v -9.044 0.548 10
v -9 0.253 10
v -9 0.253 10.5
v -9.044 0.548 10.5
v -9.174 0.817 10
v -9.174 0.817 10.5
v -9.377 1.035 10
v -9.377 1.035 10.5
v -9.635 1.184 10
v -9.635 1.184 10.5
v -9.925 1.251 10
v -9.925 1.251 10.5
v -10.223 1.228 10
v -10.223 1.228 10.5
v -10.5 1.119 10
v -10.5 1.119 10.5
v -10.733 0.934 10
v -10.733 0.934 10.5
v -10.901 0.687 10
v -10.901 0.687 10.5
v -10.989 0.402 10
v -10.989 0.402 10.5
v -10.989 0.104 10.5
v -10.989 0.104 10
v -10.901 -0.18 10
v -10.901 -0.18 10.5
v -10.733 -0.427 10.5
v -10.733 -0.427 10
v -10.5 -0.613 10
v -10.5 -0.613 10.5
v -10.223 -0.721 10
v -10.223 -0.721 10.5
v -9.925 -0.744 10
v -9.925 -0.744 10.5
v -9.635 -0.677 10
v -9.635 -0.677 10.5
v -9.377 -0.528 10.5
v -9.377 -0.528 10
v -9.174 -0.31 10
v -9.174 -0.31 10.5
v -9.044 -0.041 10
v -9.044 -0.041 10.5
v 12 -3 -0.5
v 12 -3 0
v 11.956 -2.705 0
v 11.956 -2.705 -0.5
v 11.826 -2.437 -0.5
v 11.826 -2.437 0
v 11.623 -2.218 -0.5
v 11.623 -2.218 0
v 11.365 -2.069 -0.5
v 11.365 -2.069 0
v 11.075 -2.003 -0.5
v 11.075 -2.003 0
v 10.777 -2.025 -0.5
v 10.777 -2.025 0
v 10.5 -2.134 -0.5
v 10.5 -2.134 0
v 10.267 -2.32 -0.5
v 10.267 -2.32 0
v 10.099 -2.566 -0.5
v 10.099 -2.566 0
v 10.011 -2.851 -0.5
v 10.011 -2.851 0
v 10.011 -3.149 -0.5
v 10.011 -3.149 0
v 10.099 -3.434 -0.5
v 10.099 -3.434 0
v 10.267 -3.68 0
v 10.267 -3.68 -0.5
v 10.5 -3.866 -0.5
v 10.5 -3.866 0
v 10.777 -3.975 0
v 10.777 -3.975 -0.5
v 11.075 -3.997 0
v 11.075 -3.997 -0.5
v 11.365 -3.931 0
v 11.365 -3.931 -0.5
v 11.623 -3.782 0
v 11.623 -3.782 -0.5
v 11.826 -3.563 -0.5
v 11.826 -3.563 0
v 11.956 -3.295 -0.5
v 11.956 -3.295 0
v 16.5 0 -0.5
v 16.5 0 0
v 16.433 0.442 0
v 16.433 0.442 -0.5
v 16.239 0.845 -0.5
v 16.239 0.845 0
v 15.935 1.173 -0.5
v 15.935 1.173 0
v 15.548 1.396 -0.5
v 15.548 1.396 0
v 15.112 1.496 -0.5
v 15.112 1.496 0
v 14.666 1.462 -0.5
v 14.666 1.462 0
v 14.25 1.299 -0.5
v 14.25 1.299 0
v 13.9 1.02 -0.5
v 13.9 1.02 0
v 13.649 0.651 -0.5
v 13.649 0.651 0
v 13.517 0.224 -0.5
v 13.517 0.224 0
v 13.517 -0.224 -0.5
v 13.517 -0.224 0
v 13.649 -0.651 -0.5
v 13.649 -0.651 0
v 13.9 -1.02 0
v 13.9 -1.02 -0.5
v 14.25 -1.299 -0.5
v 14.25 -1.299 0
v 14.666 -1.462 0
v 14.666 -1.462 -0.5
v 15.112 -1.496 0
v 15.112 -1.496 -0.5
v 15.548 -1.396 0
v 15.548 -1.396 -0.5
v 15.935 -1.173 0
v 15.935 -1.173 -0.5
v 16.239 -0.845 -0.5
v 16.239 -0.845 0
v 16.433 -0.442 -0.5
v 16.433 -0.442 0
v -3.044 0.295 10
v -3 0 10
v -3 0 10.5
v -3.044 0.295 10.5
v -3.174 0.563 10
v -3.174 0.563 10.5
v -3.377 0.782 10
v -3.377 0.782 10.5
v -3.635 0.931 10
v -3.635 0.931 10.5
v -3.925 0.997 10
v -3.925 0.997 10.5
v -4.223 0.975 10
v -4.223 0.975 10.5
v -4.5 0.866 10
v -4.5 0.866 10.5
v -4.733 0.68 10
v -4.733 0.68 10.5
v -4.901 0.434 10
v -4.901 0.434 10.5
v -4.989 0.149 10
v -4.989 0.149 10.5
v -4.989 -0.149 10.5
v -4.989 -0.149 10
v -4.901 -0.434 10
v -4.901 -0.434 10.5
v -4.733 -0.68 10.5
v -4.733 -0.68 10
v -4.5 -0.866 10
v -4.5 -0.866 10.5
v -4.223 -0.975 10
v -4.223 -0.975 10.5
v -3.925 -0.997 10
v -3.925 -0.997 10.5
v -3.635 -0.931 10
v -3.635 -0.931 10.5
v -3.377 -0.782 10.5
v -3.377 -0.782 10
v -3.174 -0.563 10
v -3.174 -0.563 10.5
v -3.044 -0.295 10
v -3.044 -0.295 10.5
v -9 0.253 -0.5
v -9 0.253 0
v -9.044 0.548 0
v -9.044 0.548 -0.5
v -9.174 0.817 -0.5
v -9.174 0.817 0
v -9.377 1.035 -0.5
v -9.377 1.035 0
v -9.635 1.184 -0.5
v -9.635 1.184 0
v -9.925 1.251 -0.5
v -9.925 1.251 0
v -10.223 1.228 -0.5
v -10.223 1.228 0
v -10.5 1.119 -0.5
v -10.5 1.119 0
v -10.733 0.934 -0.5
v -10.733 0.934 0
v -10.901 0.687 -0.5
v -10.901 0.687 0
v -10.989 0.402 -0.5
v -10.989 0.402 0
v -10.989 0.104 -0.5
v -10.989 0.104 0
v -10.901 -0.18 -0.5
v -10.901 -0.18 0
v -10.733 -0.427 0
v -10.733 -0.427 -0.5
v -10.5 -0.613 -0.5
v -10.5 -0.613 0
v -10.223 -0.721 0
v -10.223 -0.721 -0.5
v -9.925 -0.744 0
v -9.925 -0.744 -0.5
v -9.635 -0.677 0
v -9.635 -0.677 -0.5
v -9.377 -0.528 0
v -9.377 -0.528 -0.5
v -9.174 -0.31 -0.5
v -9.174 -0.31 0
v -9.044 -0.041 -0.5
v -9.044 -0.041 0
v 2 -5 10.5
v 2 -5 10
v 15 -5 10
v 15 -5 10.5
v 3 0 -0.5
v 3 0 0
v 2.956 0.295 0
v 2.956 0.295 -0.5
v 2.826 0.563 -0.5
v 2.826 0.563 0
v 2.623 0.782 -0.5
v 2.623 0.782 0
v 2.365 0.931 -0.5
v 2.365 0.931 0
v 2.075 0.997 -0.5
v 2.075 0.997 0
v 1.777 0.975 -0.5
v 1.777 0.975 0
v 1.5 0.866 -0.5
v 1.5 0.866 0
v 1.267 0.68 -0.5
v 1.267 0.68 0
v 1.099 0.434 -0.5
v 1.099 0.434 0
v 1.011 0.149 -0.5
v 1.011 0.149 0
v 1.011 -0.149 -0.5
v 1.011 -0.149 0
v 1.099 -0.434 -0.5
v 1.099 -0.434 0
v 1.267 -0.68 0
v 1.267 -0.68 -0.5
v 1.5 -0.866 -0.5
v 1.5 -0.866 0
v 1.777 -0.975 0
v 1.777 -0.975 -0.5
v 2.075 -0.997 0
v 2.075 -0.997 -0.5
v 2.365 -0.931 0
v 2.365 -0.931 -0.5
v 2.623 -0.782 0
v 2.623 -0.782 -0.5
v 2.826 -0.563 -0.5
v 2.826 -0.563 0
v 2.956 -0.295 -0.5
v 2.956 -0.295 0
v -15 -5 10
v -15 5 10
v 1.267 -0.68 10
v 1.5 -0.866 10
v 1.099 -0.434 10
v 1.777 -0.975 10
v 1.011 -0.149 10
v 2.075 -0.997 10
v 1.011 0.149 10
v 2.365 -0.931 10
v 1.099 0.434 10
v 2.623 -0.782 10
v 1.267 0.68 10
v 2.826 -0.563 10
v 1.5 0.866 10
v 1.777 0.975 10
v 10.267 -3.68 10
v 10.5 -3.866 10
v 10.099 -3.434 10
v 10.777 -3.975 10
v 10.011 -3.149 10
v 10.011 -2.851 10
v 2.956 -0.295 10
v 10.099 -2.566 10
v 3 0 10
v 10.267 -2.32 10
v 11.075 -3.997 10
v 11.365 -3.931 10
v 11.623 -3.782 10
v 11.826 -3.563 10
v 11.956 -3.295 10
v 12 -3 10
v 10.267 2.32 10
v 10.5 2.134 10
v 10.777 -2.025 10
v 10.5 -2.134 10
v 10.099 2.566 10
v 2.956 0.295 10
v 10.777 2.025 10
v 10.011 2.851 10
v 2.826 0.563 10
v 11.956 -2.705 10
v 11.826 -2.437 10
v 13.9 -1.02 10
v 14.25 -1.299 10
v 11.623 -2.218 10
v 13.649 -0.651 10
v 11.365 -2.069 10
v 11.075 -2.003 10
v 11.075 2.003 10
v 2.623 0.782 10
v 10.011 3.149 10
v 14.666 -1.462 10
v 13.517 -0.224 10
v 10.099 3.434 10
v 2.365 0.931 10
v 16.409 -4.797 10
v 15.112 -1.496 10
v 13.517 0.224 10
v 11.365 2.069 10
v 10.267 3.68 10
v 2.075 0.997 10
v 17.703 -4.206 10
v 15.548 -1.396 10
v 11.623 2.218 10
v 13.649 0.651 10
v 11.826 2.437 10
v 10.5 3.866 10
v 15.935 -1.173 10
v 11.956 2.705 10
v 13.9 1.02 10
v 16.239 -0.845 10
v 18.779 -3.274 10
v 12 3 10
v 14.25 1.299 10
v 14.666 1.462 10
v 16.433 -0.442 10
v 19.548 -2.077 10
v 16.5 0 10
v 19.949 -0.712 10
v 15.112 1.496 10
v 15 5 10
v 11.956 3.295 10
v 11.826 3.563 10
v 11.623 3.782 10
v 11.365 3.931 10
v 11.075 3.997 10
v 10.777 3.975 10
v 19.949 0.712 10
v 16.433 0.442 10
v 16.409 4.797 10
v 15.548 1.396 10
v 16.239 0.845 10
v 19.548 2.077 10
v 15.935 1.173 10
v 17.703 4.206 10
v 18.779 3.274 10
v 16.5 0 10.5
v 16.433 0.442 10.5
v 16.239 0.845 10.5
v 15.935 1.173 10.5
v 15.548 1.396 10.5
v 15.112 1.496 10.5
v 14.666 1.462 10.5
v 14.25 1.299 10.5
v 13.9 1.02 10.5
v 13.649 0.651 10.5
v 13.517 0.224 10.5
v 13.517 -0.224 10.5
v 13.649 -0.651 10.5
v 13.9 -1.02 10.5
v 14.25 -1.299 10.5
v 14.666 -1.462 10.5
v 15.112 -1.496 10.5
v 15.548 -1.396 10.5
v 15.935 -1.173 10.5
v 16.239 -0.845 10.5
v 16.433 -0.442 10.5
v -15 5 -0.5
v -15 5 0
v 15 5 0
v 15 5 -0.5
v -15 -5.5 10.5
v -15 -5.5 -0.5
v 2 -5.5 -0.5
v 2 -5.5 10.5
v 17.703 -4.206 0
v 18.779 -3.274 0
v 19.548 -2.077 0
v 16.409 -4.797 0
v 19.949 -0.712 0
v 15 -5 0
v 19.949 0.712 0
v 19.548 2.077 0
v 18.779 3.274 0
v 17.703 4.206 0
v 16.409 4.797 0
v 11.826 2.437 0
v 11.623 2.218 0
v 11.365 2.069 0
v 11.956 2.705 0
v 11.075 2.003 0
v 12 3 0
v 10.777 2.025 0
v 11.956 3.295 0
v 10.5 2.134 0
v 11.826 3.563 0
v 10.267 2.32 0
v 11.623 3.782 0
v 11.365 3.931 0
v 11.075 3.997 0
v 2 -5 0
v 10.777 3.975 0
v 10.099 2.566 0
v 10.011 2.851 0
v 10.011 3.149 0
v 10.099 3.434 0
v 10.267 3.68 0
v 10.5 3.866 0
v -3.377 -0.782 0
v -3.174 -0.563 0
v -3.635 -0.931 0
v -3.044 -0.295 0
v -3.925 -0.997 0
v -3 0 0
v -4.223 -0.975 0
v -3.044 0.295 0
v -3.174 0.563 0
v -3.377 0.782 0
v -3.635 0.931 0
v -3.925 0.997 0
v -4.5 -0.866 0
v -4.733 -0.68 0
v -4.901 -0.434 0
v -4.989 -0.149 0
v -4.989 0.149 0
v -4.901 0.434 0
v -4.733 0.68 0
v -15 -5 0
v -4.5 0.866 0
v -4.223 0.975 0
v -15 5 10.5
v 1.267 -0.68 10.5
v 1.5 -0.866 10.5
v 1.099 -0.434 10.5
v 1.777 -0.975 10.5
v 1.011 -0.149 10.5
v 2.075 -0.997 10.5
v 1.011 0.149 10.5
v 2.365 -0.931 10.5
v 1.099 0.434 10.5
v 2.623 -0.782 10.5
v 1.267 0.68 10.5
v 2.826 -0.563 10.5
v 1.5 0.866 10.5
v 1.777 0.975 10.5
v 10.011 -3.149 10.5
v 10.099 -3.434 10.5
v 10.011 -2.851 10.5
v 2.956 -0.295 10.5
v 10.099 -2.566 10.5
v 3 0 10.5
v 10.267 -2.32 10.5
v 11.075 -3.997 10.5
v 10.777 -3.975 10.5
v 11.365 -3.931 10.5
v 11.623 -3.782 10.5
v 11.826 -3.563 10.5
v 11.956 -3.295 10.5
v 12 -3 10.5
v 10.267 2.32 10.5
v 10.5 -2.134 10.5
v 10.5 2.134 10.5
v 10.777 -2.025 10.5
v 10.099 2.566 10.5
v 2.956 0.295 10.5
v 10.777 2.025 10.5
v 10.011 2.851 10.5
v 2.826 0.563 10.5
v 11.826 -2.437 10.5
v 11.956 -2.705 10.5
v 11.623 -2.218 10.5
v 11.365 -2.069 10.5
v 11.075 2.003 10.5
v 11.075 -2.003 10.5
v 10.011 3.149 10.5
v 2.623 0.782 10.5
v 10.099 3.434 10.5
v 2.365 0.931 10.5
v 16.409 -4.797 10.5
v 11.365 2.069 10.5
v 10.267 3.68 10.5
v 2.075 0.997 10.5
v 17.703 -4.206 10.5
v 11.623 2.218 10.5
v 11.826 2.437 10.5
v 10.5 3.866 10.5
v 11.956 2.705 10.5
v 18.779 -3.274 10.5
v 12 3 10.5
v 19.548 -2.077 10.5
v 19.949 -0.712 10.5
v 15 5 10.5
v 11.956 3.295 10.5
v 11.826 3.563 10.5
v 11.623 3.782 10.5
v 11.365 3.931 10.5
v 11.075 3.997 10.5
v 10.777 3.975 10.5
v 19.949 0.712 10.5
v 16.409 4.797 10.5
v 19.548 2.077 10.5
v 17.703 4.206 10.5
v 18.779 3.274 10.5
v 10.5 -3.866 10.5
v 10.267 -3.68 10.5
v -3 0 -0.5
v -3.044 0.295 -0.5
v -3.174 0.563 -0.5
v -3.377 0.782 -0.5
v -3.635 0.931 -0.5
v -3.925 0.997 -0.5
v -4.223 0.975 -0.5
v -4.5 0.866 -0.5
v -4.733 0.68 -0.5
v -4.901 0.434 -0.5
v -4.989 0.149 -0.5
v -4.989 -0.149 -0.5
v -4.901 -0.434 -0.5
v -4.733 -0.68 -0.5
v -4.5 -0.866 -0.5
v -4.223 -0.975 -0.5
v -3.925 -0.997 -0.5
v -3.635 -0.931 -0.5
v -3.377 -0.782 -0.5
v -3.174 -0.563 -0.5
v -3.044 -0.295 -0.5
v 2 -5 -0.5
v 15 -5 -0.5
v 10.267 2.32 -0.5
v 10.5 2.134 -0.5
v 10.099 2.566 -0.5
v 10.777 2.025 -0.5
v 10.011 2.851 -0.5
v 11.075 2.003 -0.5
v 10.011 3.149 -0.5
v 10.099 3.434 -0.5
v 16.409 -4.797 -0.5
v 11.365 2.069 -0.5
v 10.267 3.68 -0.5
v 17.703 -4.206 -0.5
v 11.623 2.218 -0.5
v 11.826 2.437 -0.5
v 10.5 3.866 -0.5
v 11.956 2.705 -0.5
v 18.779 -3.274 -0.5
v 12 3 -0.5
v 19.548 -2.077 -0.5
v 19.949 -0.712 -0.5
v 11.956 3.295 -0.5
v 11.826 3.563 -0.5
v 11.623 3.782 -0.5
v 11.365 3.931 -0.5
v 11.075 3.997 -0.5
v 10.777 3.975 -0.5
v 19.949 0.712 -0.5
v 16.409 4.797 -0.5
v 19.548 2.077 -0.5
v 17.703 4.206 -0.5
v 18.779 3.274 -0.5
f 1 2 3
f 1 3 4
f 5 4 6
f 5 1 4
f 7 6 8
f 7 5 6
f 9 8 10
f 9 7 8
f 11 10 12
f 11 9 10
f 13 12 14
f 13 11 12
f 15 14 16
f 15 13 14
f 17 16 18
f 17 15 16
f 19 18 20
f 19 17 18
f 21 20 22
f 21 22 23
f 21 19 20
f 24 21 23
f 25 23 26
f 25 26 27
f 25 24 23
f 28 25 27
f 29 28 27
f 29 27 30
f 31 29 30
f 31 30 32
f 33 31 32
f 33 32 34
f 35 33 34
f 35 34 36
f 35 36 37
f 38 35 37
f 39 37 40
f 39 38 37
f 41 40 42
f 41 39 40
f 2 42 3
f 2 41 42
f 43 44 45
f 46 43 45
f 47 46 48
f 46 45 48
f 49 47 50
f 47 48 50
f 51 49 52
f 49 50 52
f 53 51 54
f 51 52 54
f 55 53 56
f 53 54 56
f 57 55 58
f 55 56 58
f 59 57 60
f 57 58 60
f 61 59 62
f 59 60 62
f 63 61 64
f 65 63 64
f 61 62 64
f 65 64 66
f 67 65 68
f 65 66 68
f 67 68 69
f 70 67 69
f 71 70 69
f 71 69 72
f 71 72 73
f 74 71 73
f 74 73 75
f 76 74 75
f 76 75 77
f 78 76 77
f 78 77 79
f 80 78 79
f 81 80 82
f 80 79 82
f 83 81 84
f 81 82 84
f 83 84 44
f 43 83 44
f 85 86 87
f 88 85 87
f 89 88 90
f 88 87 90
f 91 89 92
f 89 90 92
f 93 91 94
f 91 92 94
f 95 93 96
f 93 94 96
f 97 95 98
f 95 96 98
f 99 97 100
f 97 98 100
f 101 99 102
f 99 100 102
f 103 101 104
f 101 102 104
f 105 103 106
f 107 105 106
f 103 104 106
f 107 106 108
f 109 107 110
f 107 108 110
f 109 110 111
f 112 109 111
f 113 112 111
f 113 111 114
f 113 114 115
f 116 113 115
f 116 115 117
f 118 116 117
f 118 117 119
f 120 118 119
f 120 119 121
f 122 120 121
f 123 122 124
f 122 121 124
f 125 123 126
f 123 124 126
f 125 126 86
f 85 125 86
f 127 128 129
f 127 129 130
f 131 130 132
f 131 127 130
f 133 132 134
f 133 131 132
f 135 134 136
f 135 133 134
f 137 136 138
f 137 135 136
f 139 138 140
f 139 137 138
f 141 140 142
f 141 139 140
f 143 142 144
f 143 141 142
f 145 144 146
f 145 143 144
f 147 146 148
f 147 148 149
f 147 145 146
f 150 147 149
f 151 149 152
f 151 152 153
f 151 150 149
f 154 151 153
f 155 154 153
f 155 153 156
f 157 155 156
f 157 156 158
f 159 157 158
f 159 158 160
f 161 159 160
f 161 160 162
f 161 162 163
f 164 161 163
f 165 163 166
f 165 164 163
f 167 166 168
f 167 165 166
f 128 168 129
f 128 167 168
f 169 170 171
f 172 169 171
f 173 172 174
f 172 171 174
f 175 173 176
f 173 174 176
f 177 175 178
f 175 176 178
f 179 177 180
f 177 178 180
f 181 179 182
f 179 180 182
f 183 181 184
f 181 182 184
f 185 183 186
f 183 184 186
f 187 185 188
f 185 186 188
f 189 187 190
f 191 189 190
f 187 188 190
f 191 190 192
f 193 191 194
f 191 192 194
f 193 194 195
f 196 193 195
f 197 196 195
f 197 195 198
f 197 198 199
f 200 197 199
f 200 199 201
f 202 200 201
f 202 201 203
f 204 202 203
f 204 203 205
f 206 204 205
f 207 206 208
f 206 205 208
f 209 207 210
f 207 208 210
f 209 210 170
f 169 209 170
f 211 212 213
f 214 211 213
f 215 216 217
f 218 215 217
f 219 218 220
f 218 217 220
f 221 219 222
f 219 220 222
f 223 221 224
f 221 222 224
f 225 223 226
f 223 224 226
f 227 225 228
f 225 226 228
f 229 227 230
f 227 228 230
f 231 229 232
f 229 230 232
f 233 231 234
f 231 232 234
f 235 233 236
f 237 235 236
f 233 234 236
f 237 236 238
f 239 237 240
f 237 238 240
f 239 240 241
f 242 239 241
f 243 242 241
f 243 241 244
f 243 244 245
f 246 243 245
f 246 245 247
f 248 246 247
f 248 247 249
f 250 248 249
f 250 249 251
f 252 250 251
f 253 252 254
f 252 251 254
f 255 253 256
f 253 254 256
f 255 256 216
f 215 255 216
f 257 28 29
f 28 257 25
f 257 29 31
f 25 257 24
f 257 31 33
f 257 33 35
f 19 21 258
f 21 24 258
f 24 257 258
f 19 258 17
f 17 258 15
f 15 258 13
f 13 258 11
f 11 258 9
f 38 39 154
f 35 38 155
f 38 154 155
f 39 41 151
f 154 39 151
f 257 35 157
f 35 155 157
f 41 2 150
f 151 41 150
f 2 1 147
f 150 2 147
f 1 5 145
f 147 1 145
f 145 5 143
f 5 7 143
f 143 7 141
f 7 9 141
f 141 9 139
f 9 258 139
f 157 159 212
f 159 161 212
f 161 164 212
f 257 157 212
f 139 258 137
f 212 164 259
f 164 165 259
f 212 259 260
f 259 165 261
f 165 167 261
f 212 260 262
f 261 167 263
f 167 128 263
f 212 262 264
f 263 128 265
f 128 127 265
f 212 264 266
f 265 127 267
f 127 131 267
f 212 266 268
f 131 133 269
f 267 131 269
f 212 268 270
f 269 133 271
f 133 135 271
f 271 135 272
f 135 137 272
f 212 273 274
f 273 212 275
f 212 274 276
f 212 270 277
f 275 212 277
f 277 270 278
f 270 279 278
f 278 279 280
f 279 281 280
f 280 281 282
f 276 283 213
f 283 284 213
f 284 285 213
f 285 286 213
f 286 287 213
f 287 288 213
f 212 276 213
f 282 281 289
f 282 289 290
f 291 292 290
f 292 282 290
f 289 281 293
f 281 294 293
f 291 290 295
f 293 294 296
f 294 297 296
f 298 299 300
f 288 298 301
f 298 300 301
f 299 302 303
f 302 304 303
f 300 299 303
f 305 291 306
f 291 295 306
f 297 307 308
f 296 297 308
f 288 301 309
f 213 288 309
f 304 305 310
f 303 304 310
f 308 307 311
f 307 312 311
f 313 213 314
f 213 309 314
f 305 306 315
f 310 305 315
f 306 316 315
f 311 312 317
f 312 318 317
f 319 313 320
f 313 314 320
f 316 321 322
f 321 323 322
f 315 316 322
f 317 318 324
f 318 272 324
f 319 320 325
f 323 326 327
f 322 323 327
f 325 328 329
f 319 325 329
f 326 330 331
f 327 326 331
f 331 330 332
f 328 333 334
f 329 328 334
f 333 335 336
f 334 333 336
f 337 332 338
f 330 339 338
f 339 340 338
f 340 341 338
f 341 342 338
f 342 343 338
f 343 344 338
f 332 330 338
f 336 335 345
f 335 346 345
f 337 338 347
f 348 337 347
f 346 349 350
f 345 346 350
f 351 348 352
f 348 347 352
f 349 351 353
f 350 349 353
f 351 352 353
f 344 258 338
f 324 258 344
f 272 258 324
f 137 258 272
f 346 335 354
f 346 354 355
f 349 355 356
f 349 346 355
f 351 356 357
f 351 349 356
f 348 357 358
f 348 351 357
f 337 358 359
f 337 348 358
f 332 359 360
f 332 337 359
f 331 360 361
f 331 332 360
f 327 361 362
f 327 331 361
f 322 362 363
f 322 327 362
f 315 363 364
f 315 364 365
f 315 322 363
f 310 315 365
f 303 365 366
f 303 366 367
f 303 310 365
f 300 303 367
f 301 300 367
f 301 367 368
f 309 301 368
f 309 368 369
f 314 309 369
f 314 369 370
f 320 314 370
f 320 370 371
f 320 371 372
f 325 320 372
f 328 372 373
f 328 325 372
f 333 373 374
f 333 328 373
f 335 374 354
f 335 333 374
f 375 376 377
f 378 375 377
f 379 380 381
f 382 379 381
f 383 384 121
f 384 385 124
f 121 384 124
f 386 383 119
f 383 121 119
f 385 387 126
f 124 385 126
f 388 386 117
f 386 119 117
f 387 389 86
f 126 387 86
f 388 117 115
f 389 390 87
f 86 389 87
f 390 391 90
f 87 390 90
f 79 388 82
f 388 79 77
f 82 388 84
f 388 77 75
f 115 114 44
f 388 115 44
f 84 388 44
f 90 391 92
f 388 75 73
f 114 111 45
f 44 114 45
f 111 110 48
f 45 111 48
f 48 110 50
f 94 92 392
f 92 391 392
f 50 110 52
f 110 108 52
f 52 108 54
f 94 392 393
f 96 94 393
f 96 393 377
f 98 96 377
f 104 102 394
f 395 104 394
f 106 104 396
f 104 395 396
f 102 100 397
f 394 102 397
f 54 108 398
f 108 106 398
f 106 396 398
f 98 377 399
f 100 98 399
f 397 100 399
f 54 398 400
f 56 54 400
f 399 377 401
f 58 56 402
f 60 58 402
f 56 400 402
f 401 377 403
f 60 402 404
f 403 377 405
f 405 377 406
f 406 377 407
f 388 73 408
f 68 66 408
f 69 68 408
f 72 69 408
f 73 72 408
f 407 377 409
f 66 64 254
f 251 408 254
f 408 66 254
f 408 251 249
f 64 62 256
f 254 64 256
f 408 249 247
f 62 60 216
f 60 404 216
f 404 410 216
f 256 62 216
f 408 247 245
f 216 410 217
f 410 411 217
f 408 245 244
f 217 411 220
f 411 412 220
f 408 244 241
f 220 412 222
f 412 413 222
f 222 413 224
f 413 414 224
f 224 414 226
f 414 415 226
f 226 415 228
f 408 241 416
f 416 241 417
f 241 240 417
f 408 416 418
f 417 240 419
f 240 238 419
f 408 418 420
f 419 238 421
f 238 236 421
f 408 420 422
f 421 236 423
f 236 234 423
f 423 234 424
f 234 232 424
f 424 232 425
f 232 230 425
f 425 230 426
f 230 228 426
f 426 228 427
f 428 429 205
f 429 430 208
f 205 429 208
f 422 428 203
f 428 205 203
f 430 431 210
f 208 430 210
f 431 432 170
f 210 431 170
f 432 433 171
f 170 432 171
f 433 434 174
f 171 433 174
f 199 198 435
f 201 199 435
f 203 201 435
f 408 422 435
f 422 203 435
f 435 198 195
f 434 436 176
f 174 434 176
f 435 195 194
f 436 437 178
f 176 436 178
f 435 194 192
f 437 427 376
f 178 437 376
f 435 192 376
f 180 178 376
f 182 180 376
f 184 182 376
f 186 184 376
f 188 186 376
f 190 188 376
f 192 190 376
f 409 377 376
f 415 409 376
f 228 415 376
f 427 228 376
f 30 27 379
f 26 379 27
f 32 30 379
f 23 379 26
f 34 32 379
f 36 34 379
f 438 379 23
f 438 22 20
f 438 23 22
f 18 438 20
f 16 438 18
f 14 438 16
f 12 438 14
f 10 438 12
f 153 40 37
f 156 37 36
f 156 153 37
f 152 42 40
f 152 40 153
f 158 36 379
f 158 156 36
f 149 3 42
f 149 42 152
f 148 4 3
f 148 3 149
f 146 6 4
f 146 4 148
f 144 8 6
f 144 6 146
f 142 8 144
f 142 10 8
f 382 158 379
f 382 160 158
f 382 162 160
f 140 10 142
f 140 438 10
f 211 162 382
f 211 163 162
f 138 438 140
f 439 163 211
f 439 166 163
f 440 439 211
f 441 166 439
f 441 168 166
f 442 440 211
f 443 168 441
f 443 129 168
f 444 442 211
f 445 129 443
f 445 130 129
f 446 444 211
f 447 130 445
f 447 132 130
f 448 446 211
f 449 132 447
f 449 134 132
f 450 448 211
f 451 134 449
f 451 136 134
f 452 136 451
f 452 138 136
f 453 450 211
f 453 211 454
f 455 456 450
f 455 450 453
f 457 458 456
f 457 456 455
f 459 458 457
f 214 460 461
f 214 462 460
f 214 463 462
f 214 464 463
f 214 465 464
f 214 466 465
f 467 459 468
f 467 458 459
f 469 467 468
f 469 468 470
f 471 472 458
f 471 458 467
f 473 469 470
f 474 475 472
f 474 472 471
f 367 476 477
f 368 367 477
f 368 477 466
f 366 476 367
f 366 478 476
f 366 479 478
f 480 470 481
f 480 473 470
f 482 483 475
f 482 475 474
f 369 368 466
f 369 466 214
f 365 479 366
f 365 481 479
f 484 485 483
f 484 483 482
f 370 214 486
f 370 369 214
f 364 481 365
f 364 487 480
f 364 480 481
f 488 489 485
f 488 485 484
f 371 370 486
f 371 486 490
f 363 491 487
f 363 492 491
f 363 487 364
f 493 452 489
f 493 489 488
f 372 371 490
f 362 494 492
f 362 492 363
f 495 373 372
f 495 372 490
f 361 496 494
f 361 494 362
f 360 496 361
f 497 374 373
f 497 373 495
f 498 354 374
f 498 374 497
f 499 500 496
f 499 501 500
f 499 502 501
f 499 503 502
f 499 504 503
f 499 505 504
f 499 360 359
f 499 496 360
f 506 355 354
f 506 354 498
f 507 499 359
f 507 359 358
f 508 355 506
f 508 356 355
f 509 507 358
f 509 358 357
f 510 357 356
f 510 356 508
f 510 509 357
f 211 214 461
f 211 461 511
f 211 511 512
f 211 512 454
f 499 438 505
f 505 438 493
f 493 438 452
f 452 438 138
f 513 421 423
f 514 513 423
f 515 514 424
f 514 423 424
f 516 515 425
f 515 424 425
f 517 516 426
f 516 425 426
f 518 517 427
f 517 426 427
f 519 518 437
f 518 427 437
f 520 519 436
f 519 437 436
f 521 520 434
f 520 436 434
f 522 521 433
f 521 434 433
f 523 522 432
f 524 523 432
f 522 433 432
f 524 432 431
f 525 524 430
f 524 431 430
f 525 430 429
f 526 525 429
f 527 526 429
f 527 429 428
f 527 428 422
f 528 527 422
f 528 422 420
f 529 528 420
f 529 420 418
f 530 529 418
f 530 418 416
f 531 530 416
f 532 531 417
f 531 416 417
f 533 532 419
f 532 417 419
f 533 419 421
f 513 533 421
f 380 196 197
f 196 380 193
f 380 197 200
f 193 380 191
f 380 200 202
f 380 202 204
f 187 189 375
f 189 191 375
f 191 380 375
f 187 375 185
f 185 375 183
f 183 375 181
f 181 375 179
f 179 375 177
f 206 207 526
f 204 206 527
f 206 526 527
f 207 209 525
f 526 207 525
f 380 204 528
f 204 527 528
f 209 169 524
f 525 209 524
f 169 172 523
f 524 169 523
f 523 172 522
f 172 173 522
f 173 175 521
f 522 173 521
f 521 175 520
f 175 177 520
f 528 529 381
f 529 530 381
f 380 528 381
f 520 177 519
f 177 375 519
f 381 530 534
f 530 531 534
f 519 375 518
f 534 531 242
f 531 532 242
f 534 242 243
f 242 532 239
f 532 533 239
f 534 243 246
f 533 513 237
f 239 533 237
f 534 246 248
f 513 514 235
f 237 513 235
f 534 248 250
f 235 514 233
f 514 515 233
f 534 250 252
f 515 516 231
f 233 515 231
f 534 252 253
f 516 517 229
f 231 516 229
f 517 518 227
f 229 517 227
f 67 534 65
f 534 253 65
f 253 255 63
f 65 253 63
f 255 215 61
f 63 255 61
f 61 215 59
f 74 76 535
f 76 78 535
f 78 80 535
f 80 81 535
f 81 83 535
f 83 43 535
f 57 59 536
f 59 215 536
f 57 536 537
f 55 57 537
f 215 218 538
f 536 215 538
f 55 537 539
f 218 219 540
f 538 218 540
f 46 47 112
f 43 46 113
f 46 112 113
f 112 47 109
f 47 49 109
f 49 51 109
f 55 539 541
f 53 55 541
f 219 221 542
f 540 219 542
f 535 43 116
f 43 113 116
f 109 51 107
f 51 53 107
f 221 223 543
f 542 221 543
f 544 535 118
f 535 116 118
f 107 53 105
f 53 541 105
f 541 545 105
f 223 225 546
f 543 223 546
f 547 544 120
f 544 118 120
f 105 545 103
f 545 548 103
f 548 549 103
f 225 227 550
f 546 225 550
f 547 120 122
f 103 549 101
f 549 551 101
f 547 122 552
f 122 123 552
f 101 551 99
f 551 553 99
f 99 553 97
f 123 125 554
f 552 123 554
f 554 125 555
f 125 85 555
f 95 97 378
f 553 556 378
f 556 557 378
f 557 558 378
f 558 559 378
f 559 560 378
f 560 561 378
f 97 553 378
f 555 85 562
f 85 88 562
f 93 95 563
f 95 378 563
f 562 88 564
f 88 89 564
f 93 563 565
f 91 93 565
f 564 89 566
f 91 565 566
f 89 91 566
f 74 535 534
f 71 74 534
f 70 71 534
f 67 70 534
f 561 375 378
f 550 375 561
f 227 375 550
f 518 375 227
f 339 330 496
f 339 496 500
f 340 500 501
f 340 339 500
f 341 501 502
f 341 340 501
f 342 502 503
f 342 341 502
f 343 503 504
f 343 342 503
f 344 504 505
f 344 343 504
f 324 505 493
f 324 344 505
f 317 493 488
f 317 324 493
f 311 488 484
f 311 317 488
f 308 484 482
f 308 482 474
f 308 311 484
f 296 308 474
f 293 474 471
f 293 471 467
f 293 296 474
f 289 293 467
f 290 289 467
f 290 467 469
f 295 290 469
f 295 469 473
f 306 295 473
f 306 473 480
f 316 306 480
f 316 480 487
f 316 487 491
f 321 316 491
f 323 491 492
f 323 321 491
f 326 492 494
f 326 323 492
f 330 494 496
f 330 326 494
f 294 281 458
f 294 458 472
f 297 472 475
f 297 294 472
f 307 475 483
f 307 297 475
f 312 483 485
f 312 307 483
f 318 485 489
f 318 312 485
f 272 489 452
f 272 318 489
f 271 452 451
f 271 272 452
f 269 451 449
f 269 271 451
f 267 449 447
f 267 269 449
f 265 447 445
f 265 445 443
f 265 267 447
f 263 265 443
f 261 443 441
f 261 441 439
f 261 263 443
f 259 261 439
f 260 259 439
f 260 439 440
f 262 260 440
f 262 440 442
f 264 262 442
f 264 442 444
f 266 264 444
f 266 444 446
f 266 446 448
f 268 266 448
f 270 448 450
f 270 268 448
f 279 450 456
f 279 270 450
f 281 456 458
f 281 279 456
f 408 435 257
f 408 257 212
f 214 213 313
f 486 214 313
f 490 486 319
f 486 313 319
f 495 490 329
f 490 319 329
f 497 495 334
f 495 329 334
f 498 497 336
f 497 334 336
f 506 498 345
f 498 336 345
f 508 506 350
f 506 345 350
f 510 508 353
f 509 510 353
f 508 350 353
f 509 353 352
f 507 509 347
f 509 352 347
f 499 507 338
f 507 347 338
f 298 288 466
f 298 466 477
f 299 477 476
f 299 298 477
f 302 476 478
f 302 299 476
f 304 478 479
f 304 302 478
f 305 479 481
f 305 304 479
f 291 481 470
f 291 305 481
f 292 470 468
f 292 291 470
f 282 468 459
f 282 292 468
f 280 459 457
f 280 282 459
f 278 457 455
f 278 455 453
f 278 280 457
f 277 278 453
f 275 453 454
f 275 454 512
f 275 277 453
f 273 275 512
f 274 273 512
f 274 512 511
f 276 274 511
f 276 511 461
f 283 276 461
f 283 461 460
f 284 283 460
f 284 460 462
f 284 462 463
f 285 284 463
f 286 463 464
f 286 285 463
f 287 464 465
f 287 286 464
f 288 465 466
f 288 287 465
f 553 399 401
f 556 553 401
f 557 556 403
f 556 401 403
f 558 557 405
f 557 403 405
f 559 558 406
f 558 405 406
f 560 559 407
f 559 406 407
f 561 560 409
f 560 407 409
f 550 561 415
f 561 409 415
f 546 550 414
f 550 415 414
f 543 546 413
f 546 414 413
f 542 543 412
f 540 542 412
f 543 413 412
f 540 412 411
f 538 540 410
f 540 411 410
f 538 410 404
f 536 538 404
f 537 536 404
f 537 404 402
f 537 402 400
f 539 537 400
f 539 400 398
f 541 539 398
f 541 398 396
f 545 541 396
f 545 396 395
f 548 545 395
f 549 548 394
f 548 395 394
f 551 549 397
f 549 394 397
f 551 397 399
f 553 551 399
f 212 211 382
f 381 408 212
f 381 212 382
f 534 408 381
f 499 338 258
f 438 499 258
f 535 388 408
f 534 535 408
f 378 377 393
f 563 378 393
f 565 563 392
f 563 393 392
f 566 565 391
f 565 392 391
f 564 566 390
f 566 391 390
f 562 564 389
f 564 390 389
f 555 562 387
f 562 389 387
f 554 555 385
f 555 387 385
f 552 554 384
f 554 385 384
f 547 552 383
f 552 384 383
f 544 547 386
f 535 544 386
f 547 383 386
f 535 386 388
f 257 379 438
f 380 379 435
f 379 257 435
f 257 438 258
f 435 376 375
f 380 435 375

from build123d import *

# Parameters (mm, degrees)
SKETCH_2_R      = 1.5
SKETCH_2_R_2    = 1
EXTRUDE_1_DEPTH = 0.5
SKETCH_1_R      = 1.5
SKETCH_1_R_2    = 1
EXTRUDE_2_DEPTH = 0.5
SKETCH_4_W      = 17
SKETCH_4_H      = 11
EXTRUDE_4_DEPTH = 0.5


with BuildPart() as part:
    # 草图2 → 凸台-拉伸1 (new body)
    with BuildSketch(Plane.XY.offset(10)):
        with BuildLine():
            Line((15, 5), (-15, 5))
            Line((-15, 5), (-15, -5))
            Line((-15, -5), (15, -5))
            ThreePointArc((15, -5), (20, 0), (15, 5))
        make_face()
        with Locations((15, 0)):
            Circle(SKETCH_2_R, mode=Mode.SUBTRACT)
        with Locations((11, -3)):
            Circle(SKETCH_2_R_2, mode=Mode.SUBTRACT)
        with Locations((11, 3)):
            Circle(SKETCH_2_R_2, mode=Mode.SUBTRACT)
        with Locations((2, 0)):
            Circle(SKETCH_2_R_2, mode=Mode.SUBTRACT)
        with Locations((-4, 0)):
            Circle(SKETCH_2_R_2, mode=Mode.SUBTRACT)
        with Locations((-10, 0.253438211)):
            Circle(SKETCH_2_R_2, mode=Mode.SUBTRACT)
    extrude(amount=EXTRUDE_1_DEPTH)



with BuildPart() as body_2:
    # 草图1 → 凸台-拉伸2 (new body)
    with BuildSketch(Plane.XY):
        with BuildLine():
            Line((-15, 5), (15, 5))
            ThreePointArc((15, 5), (20, 0), (15, -5))
            Line((15, -5), (-15, -5))
            Line((-15, -5), (-15, 5))
        make_face()
        with Locations((15, 0)):
            Circle(SKETCH_1_R, mode=Mode.SUBTRACT)
        with Locations((-10, 0.253438211)):
            Circle(SKETCH_1_R_2, mode=Mode.SUBTRACT)
        with Locations((-4, 0)):
            Circle(SKETCH_1_R_2, mode=Mode.SUBTRACT)
        with Locations((2, 0)):
            Circle(SKETCH_1_R_2, mode=Mode.SUBTRACT)
        with Locations((11, 3)):
            Circle(SKETCH_1_R_2, mode=Mode.SUBTRACT)
        with Locations((11, -3)):
            Circle(SKETCH_1_R_2, mode=Mode.SUBTRACT)
    extrude(amount=-EXTRUDE_2_DEPTH)


with BuildPart() as part_1:
    add(part.part)

    add(body_2.part)  # 凸台-拉伸4 merges body 2
    # 草图4 → 凸台-拉伸4 (add)
    with BuildSketch(Plane(origin=(0, -5, 0), x_dir=(1, 0, 0), z_dir=(0, 1, 0))):
        with Locations((-6.5, -5)):
            Rectangle(SKETCH_4_W, SKETCH_4_H)
    extrude(amount=-EXTRUDE_4_DEPTH)


solid = part_1.part
